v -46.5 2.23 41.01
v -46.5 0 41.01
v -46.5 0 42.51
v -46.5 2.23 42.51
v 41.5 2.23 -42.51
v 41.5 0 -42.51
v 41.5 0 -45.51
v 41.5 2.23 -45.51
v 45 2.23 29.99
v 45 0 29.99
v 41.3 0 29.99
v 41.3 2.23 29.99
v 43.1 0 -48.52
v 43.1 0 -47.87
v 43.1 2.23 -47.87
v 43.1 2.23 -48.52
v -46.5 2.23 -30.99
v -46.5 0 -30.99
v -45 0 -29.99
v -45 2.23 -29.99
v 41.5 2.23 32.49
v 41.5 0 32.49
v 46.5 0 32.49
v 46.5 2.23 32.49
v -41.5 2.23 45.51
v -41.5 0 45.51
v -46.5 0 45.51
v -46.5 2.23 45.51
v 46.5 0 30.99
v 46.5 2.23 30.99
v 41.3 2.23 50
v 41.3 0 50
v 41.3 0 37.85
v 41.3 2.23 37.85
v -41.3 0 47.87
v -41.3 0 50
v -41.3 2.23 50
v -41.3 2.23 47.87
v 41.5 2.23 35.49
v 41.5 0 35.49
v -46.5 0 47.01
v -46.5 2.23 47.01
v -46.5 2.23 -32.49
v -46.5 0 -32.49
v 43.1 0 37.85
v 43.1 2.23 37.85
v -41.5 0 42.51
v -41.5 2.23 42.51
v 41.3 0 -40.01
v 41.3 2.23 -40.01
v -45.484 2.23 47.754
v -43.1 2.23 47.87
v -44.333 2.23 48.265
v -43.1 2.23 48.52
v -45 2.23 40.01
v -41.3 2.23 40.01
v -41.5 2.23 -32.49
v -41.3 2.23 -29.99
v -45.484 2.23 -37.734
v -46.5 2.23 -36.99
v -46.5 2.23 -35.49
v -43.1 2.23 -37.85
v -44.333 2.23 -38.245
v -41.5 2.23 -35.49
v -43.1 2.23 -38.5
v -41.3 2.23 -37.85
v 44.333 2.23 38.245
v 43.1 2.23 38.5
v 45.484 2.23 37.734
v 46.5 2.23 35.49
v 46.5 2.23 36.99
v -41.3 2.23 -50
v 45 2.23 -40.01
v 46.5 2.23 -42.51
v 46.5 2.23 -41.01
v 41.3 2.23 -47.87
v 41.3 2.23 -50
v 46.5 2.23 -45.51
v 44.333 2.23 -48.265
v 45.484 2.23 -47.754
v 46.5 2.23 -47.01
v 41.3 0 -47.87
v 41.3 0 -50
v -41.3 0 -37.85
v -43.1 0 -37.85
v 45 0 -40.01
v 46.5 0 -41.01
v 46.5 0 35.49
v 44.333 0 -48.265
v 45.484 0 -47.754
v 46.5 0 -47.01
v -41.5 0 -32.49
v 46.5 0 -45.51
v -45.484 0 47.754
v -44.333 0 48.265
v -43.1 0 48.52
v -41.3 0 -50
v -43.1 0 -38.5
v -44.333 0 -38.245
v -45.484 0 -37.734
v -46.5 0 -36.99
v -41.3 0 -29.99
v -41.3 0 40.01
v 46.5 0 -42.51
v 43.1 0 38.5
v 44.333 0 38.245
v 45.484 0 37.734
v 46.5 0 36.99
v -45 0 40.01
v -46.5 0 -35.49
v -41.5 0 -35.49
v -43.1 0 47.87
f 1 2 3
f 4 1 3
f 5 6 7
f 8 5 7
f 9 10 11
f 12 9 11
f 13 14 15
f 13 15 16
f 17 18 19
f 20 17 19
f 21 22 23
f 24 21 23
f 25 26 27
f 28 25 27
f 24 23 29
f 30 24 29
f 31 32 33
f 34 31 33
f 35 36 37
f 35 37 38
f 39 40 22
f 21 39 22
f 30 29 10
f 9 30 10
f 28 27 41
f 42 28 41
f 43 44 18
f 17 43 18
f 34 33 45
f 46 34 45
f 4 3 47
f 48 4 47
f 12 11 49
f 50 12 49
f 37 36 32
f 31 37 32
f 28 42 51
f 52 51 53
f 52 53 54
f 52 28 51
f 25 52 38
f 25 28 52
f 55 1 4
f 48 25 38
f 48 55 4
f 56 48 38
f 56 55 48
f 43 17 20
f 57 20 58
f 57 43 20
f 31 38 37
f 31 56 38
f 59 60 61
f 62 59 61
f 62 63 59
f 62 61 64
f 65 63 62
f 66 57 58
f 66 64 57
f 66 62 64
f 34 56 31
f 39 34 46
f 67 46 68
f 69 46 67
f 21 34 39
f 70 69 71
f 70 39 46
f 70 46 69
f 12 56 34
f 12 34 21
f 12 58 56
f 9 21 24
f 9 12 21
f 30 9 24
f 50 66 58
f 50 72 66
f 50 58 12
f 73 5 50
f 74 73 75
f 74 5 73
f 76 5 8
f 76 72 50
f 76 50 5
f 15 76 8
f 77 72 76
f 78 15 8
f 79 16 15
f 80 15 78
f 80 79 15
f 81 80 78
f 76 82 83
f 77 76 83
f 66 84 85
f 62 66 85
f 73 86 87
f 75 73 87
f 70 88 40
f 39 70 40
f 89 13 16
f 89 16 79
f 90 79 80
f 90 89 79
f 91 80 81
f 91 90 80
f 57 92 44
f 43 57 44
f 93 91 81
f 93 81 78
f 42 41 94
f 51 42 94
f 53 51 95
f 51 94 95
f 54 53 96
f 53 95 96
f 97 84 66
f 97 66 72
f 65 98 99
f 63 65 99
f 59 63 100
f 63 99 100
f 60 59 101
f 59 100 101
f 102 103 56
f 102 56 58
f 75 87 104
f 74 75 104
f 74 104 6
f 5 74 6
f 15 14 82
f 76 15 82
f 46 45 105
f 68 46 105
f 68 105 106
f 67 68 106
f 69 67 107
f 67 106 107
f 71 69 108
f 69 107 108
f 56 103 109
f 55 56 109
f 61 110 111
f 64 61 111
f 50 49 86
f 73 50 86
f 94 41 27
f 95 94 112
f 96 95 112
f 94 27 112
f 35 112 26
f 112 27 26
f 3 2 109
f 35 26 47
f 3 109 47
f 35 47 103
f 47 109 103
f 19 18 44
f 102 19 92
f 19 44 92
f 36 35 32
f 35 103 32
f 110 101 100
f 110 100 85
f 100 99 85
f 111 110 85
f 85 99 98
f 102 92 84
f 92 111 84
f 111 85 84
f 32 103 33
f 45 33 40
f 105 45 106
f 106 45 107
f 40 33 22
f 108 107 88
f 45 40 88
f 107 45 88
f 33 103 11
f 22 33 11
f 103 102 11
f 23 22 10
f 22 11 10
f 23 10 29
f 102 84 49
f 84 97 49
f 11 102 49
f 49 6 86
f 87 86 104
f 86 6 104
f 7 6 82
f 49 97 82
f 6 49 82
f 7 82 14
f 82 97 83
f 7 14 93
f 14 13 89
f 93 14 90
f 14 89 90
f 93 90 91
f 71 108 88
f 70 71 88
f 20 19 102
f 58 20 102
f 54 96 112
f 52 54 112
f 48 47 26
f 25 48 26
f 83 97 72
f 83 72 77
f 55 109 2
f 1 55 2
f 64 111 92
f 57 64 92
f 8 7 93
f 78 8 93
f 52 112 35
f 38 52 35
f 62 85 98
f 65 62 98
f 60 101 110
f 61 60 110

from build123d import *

# Parameters (mm, degrees)
SKETCH1_W           = 0.2
SKETCH1_H           = 3
SKETCH1_W_2         = 82.6
SKETCH1_H_2         = 100
BOSS_EXTRUDE1_DEPTH = 2.23


with BuildPart() as part:
    # Sketch1 → Boss-Extrude1 (new body)
    with BuildSketch(Plane(origin=(0, 0, 0), x_dir=(1, 0, 0), z_dir=(0, 1, 0))):
        with BuildLine():
            Line((43.1, -37.85), (43.1, -38.5))
            ThreePointArc((43.1, -38.5), (44.922195524, -38.020142239), (46.5, -36.99))
            Line((46.5, -36.99), (46.5, -35.49))
            Line((46.5, -35.49), (43.1, -35.49))
            Line((43.1, -35.49), (43.1, -37.85))
        make_face()
        Polygon((41.5, -35.49), (41.3, -35.49), (41.3, -37.85), (43.1, -37.85), (43.1, -35.49), align=None)
        Polygon((45, -29.99), (41.3, -29.99), (41.3, -32.49), (41.5, -32.49), (46.5, -32.49), (46.5, -30.99), align=None)
        with Locations((41.4, -33.99)):
            Rectangle(SKETCH1_W, SKETCH1_H)
        Rectangle(SKETCH1_W_2, SKETCH1_H_2)
        Polygon((46.5, 42.51), (41.5, 42.51), (41.3, 42.51), (41.3, 40.01), (45, 40.01), (46.5, 41.01), align=None)
        with Locations((41.4, 44.01)):
            Rectangle(SKETCH1_W, SKETCH1_H)
        Polygon((41.5, 45.51), (43.1, 45.51), (43.1, 47.87), (41.3, 47.87), (41.3, 45.51), align=None)
        with BuildLine():
            ThreePointArc((43.1, 48.52), (44.922195524, 48.040142239), (46.5, 47.01))
            Line((46.5, 47.01), (46.5, 45.51))
            Line((46.5, 45.51), (43.1, 45.51))
            Line((43.1, 45.51), (43.1, 47.87))
            Line((43.1, 47.87), (43.1, 48.52))
        make_face()
        with BuildLine():
            Line((-43.1, -47.87), (-41.3, -47.87))
            Line((-41.3, -47.87), (-41.3, -45.51))
            Line((-41.3, -45.51), (-41.5, -45.51))
            Line((-41.5, -45.51), (-46.5, -45.51))
            Line((-46.5, -45.51), (-46.5, -47.01))
            ThreePointArc((-46.5, -47.01), (-44.922195524, -48.040142239), (-43.1, -48.52))
            Line((-43.1, -48.52), (-43.1, -47.87))
        make_face()
        Polygon((-41.3, -45.51), (-41.3, -40.01), (-45, -40.01), (-46.5, -41.01), (-46.5, -42.51), (-41.5, -42.51), (-41.5, -45.51), align=None)
        Polygon((-41.3, 29.99), (-41.3, 35.49), (-41.5, 35.49), (-41.5, 32.49), (-46.5, 32.49), (-46.5, 30.99), (-45, 29.99), align=None)
        with BuildLine():
            Line((-41.3, 35.49), (-41.3, 37.85))
            Line((-41.3, 37.85), (-43.1, 37.85))
            Line((-43.1, 37.85), (-43.1, 38.5))
            ThreePointArc((-43.1, 38.5), (-44.922195524, 38.020142239), (-46.5, 36.99))
            Line((-46.5, 36.99), (-46.5, 35.49))
            Line((-46.5, 35.49), (-41.5, 35.49))
            Line((-41.5, 35.49), (-41.3, 35.49))
        make_face()
    extrude(amount=BOSS_EXTRUDE1_DEPTH)


solid = part.part
